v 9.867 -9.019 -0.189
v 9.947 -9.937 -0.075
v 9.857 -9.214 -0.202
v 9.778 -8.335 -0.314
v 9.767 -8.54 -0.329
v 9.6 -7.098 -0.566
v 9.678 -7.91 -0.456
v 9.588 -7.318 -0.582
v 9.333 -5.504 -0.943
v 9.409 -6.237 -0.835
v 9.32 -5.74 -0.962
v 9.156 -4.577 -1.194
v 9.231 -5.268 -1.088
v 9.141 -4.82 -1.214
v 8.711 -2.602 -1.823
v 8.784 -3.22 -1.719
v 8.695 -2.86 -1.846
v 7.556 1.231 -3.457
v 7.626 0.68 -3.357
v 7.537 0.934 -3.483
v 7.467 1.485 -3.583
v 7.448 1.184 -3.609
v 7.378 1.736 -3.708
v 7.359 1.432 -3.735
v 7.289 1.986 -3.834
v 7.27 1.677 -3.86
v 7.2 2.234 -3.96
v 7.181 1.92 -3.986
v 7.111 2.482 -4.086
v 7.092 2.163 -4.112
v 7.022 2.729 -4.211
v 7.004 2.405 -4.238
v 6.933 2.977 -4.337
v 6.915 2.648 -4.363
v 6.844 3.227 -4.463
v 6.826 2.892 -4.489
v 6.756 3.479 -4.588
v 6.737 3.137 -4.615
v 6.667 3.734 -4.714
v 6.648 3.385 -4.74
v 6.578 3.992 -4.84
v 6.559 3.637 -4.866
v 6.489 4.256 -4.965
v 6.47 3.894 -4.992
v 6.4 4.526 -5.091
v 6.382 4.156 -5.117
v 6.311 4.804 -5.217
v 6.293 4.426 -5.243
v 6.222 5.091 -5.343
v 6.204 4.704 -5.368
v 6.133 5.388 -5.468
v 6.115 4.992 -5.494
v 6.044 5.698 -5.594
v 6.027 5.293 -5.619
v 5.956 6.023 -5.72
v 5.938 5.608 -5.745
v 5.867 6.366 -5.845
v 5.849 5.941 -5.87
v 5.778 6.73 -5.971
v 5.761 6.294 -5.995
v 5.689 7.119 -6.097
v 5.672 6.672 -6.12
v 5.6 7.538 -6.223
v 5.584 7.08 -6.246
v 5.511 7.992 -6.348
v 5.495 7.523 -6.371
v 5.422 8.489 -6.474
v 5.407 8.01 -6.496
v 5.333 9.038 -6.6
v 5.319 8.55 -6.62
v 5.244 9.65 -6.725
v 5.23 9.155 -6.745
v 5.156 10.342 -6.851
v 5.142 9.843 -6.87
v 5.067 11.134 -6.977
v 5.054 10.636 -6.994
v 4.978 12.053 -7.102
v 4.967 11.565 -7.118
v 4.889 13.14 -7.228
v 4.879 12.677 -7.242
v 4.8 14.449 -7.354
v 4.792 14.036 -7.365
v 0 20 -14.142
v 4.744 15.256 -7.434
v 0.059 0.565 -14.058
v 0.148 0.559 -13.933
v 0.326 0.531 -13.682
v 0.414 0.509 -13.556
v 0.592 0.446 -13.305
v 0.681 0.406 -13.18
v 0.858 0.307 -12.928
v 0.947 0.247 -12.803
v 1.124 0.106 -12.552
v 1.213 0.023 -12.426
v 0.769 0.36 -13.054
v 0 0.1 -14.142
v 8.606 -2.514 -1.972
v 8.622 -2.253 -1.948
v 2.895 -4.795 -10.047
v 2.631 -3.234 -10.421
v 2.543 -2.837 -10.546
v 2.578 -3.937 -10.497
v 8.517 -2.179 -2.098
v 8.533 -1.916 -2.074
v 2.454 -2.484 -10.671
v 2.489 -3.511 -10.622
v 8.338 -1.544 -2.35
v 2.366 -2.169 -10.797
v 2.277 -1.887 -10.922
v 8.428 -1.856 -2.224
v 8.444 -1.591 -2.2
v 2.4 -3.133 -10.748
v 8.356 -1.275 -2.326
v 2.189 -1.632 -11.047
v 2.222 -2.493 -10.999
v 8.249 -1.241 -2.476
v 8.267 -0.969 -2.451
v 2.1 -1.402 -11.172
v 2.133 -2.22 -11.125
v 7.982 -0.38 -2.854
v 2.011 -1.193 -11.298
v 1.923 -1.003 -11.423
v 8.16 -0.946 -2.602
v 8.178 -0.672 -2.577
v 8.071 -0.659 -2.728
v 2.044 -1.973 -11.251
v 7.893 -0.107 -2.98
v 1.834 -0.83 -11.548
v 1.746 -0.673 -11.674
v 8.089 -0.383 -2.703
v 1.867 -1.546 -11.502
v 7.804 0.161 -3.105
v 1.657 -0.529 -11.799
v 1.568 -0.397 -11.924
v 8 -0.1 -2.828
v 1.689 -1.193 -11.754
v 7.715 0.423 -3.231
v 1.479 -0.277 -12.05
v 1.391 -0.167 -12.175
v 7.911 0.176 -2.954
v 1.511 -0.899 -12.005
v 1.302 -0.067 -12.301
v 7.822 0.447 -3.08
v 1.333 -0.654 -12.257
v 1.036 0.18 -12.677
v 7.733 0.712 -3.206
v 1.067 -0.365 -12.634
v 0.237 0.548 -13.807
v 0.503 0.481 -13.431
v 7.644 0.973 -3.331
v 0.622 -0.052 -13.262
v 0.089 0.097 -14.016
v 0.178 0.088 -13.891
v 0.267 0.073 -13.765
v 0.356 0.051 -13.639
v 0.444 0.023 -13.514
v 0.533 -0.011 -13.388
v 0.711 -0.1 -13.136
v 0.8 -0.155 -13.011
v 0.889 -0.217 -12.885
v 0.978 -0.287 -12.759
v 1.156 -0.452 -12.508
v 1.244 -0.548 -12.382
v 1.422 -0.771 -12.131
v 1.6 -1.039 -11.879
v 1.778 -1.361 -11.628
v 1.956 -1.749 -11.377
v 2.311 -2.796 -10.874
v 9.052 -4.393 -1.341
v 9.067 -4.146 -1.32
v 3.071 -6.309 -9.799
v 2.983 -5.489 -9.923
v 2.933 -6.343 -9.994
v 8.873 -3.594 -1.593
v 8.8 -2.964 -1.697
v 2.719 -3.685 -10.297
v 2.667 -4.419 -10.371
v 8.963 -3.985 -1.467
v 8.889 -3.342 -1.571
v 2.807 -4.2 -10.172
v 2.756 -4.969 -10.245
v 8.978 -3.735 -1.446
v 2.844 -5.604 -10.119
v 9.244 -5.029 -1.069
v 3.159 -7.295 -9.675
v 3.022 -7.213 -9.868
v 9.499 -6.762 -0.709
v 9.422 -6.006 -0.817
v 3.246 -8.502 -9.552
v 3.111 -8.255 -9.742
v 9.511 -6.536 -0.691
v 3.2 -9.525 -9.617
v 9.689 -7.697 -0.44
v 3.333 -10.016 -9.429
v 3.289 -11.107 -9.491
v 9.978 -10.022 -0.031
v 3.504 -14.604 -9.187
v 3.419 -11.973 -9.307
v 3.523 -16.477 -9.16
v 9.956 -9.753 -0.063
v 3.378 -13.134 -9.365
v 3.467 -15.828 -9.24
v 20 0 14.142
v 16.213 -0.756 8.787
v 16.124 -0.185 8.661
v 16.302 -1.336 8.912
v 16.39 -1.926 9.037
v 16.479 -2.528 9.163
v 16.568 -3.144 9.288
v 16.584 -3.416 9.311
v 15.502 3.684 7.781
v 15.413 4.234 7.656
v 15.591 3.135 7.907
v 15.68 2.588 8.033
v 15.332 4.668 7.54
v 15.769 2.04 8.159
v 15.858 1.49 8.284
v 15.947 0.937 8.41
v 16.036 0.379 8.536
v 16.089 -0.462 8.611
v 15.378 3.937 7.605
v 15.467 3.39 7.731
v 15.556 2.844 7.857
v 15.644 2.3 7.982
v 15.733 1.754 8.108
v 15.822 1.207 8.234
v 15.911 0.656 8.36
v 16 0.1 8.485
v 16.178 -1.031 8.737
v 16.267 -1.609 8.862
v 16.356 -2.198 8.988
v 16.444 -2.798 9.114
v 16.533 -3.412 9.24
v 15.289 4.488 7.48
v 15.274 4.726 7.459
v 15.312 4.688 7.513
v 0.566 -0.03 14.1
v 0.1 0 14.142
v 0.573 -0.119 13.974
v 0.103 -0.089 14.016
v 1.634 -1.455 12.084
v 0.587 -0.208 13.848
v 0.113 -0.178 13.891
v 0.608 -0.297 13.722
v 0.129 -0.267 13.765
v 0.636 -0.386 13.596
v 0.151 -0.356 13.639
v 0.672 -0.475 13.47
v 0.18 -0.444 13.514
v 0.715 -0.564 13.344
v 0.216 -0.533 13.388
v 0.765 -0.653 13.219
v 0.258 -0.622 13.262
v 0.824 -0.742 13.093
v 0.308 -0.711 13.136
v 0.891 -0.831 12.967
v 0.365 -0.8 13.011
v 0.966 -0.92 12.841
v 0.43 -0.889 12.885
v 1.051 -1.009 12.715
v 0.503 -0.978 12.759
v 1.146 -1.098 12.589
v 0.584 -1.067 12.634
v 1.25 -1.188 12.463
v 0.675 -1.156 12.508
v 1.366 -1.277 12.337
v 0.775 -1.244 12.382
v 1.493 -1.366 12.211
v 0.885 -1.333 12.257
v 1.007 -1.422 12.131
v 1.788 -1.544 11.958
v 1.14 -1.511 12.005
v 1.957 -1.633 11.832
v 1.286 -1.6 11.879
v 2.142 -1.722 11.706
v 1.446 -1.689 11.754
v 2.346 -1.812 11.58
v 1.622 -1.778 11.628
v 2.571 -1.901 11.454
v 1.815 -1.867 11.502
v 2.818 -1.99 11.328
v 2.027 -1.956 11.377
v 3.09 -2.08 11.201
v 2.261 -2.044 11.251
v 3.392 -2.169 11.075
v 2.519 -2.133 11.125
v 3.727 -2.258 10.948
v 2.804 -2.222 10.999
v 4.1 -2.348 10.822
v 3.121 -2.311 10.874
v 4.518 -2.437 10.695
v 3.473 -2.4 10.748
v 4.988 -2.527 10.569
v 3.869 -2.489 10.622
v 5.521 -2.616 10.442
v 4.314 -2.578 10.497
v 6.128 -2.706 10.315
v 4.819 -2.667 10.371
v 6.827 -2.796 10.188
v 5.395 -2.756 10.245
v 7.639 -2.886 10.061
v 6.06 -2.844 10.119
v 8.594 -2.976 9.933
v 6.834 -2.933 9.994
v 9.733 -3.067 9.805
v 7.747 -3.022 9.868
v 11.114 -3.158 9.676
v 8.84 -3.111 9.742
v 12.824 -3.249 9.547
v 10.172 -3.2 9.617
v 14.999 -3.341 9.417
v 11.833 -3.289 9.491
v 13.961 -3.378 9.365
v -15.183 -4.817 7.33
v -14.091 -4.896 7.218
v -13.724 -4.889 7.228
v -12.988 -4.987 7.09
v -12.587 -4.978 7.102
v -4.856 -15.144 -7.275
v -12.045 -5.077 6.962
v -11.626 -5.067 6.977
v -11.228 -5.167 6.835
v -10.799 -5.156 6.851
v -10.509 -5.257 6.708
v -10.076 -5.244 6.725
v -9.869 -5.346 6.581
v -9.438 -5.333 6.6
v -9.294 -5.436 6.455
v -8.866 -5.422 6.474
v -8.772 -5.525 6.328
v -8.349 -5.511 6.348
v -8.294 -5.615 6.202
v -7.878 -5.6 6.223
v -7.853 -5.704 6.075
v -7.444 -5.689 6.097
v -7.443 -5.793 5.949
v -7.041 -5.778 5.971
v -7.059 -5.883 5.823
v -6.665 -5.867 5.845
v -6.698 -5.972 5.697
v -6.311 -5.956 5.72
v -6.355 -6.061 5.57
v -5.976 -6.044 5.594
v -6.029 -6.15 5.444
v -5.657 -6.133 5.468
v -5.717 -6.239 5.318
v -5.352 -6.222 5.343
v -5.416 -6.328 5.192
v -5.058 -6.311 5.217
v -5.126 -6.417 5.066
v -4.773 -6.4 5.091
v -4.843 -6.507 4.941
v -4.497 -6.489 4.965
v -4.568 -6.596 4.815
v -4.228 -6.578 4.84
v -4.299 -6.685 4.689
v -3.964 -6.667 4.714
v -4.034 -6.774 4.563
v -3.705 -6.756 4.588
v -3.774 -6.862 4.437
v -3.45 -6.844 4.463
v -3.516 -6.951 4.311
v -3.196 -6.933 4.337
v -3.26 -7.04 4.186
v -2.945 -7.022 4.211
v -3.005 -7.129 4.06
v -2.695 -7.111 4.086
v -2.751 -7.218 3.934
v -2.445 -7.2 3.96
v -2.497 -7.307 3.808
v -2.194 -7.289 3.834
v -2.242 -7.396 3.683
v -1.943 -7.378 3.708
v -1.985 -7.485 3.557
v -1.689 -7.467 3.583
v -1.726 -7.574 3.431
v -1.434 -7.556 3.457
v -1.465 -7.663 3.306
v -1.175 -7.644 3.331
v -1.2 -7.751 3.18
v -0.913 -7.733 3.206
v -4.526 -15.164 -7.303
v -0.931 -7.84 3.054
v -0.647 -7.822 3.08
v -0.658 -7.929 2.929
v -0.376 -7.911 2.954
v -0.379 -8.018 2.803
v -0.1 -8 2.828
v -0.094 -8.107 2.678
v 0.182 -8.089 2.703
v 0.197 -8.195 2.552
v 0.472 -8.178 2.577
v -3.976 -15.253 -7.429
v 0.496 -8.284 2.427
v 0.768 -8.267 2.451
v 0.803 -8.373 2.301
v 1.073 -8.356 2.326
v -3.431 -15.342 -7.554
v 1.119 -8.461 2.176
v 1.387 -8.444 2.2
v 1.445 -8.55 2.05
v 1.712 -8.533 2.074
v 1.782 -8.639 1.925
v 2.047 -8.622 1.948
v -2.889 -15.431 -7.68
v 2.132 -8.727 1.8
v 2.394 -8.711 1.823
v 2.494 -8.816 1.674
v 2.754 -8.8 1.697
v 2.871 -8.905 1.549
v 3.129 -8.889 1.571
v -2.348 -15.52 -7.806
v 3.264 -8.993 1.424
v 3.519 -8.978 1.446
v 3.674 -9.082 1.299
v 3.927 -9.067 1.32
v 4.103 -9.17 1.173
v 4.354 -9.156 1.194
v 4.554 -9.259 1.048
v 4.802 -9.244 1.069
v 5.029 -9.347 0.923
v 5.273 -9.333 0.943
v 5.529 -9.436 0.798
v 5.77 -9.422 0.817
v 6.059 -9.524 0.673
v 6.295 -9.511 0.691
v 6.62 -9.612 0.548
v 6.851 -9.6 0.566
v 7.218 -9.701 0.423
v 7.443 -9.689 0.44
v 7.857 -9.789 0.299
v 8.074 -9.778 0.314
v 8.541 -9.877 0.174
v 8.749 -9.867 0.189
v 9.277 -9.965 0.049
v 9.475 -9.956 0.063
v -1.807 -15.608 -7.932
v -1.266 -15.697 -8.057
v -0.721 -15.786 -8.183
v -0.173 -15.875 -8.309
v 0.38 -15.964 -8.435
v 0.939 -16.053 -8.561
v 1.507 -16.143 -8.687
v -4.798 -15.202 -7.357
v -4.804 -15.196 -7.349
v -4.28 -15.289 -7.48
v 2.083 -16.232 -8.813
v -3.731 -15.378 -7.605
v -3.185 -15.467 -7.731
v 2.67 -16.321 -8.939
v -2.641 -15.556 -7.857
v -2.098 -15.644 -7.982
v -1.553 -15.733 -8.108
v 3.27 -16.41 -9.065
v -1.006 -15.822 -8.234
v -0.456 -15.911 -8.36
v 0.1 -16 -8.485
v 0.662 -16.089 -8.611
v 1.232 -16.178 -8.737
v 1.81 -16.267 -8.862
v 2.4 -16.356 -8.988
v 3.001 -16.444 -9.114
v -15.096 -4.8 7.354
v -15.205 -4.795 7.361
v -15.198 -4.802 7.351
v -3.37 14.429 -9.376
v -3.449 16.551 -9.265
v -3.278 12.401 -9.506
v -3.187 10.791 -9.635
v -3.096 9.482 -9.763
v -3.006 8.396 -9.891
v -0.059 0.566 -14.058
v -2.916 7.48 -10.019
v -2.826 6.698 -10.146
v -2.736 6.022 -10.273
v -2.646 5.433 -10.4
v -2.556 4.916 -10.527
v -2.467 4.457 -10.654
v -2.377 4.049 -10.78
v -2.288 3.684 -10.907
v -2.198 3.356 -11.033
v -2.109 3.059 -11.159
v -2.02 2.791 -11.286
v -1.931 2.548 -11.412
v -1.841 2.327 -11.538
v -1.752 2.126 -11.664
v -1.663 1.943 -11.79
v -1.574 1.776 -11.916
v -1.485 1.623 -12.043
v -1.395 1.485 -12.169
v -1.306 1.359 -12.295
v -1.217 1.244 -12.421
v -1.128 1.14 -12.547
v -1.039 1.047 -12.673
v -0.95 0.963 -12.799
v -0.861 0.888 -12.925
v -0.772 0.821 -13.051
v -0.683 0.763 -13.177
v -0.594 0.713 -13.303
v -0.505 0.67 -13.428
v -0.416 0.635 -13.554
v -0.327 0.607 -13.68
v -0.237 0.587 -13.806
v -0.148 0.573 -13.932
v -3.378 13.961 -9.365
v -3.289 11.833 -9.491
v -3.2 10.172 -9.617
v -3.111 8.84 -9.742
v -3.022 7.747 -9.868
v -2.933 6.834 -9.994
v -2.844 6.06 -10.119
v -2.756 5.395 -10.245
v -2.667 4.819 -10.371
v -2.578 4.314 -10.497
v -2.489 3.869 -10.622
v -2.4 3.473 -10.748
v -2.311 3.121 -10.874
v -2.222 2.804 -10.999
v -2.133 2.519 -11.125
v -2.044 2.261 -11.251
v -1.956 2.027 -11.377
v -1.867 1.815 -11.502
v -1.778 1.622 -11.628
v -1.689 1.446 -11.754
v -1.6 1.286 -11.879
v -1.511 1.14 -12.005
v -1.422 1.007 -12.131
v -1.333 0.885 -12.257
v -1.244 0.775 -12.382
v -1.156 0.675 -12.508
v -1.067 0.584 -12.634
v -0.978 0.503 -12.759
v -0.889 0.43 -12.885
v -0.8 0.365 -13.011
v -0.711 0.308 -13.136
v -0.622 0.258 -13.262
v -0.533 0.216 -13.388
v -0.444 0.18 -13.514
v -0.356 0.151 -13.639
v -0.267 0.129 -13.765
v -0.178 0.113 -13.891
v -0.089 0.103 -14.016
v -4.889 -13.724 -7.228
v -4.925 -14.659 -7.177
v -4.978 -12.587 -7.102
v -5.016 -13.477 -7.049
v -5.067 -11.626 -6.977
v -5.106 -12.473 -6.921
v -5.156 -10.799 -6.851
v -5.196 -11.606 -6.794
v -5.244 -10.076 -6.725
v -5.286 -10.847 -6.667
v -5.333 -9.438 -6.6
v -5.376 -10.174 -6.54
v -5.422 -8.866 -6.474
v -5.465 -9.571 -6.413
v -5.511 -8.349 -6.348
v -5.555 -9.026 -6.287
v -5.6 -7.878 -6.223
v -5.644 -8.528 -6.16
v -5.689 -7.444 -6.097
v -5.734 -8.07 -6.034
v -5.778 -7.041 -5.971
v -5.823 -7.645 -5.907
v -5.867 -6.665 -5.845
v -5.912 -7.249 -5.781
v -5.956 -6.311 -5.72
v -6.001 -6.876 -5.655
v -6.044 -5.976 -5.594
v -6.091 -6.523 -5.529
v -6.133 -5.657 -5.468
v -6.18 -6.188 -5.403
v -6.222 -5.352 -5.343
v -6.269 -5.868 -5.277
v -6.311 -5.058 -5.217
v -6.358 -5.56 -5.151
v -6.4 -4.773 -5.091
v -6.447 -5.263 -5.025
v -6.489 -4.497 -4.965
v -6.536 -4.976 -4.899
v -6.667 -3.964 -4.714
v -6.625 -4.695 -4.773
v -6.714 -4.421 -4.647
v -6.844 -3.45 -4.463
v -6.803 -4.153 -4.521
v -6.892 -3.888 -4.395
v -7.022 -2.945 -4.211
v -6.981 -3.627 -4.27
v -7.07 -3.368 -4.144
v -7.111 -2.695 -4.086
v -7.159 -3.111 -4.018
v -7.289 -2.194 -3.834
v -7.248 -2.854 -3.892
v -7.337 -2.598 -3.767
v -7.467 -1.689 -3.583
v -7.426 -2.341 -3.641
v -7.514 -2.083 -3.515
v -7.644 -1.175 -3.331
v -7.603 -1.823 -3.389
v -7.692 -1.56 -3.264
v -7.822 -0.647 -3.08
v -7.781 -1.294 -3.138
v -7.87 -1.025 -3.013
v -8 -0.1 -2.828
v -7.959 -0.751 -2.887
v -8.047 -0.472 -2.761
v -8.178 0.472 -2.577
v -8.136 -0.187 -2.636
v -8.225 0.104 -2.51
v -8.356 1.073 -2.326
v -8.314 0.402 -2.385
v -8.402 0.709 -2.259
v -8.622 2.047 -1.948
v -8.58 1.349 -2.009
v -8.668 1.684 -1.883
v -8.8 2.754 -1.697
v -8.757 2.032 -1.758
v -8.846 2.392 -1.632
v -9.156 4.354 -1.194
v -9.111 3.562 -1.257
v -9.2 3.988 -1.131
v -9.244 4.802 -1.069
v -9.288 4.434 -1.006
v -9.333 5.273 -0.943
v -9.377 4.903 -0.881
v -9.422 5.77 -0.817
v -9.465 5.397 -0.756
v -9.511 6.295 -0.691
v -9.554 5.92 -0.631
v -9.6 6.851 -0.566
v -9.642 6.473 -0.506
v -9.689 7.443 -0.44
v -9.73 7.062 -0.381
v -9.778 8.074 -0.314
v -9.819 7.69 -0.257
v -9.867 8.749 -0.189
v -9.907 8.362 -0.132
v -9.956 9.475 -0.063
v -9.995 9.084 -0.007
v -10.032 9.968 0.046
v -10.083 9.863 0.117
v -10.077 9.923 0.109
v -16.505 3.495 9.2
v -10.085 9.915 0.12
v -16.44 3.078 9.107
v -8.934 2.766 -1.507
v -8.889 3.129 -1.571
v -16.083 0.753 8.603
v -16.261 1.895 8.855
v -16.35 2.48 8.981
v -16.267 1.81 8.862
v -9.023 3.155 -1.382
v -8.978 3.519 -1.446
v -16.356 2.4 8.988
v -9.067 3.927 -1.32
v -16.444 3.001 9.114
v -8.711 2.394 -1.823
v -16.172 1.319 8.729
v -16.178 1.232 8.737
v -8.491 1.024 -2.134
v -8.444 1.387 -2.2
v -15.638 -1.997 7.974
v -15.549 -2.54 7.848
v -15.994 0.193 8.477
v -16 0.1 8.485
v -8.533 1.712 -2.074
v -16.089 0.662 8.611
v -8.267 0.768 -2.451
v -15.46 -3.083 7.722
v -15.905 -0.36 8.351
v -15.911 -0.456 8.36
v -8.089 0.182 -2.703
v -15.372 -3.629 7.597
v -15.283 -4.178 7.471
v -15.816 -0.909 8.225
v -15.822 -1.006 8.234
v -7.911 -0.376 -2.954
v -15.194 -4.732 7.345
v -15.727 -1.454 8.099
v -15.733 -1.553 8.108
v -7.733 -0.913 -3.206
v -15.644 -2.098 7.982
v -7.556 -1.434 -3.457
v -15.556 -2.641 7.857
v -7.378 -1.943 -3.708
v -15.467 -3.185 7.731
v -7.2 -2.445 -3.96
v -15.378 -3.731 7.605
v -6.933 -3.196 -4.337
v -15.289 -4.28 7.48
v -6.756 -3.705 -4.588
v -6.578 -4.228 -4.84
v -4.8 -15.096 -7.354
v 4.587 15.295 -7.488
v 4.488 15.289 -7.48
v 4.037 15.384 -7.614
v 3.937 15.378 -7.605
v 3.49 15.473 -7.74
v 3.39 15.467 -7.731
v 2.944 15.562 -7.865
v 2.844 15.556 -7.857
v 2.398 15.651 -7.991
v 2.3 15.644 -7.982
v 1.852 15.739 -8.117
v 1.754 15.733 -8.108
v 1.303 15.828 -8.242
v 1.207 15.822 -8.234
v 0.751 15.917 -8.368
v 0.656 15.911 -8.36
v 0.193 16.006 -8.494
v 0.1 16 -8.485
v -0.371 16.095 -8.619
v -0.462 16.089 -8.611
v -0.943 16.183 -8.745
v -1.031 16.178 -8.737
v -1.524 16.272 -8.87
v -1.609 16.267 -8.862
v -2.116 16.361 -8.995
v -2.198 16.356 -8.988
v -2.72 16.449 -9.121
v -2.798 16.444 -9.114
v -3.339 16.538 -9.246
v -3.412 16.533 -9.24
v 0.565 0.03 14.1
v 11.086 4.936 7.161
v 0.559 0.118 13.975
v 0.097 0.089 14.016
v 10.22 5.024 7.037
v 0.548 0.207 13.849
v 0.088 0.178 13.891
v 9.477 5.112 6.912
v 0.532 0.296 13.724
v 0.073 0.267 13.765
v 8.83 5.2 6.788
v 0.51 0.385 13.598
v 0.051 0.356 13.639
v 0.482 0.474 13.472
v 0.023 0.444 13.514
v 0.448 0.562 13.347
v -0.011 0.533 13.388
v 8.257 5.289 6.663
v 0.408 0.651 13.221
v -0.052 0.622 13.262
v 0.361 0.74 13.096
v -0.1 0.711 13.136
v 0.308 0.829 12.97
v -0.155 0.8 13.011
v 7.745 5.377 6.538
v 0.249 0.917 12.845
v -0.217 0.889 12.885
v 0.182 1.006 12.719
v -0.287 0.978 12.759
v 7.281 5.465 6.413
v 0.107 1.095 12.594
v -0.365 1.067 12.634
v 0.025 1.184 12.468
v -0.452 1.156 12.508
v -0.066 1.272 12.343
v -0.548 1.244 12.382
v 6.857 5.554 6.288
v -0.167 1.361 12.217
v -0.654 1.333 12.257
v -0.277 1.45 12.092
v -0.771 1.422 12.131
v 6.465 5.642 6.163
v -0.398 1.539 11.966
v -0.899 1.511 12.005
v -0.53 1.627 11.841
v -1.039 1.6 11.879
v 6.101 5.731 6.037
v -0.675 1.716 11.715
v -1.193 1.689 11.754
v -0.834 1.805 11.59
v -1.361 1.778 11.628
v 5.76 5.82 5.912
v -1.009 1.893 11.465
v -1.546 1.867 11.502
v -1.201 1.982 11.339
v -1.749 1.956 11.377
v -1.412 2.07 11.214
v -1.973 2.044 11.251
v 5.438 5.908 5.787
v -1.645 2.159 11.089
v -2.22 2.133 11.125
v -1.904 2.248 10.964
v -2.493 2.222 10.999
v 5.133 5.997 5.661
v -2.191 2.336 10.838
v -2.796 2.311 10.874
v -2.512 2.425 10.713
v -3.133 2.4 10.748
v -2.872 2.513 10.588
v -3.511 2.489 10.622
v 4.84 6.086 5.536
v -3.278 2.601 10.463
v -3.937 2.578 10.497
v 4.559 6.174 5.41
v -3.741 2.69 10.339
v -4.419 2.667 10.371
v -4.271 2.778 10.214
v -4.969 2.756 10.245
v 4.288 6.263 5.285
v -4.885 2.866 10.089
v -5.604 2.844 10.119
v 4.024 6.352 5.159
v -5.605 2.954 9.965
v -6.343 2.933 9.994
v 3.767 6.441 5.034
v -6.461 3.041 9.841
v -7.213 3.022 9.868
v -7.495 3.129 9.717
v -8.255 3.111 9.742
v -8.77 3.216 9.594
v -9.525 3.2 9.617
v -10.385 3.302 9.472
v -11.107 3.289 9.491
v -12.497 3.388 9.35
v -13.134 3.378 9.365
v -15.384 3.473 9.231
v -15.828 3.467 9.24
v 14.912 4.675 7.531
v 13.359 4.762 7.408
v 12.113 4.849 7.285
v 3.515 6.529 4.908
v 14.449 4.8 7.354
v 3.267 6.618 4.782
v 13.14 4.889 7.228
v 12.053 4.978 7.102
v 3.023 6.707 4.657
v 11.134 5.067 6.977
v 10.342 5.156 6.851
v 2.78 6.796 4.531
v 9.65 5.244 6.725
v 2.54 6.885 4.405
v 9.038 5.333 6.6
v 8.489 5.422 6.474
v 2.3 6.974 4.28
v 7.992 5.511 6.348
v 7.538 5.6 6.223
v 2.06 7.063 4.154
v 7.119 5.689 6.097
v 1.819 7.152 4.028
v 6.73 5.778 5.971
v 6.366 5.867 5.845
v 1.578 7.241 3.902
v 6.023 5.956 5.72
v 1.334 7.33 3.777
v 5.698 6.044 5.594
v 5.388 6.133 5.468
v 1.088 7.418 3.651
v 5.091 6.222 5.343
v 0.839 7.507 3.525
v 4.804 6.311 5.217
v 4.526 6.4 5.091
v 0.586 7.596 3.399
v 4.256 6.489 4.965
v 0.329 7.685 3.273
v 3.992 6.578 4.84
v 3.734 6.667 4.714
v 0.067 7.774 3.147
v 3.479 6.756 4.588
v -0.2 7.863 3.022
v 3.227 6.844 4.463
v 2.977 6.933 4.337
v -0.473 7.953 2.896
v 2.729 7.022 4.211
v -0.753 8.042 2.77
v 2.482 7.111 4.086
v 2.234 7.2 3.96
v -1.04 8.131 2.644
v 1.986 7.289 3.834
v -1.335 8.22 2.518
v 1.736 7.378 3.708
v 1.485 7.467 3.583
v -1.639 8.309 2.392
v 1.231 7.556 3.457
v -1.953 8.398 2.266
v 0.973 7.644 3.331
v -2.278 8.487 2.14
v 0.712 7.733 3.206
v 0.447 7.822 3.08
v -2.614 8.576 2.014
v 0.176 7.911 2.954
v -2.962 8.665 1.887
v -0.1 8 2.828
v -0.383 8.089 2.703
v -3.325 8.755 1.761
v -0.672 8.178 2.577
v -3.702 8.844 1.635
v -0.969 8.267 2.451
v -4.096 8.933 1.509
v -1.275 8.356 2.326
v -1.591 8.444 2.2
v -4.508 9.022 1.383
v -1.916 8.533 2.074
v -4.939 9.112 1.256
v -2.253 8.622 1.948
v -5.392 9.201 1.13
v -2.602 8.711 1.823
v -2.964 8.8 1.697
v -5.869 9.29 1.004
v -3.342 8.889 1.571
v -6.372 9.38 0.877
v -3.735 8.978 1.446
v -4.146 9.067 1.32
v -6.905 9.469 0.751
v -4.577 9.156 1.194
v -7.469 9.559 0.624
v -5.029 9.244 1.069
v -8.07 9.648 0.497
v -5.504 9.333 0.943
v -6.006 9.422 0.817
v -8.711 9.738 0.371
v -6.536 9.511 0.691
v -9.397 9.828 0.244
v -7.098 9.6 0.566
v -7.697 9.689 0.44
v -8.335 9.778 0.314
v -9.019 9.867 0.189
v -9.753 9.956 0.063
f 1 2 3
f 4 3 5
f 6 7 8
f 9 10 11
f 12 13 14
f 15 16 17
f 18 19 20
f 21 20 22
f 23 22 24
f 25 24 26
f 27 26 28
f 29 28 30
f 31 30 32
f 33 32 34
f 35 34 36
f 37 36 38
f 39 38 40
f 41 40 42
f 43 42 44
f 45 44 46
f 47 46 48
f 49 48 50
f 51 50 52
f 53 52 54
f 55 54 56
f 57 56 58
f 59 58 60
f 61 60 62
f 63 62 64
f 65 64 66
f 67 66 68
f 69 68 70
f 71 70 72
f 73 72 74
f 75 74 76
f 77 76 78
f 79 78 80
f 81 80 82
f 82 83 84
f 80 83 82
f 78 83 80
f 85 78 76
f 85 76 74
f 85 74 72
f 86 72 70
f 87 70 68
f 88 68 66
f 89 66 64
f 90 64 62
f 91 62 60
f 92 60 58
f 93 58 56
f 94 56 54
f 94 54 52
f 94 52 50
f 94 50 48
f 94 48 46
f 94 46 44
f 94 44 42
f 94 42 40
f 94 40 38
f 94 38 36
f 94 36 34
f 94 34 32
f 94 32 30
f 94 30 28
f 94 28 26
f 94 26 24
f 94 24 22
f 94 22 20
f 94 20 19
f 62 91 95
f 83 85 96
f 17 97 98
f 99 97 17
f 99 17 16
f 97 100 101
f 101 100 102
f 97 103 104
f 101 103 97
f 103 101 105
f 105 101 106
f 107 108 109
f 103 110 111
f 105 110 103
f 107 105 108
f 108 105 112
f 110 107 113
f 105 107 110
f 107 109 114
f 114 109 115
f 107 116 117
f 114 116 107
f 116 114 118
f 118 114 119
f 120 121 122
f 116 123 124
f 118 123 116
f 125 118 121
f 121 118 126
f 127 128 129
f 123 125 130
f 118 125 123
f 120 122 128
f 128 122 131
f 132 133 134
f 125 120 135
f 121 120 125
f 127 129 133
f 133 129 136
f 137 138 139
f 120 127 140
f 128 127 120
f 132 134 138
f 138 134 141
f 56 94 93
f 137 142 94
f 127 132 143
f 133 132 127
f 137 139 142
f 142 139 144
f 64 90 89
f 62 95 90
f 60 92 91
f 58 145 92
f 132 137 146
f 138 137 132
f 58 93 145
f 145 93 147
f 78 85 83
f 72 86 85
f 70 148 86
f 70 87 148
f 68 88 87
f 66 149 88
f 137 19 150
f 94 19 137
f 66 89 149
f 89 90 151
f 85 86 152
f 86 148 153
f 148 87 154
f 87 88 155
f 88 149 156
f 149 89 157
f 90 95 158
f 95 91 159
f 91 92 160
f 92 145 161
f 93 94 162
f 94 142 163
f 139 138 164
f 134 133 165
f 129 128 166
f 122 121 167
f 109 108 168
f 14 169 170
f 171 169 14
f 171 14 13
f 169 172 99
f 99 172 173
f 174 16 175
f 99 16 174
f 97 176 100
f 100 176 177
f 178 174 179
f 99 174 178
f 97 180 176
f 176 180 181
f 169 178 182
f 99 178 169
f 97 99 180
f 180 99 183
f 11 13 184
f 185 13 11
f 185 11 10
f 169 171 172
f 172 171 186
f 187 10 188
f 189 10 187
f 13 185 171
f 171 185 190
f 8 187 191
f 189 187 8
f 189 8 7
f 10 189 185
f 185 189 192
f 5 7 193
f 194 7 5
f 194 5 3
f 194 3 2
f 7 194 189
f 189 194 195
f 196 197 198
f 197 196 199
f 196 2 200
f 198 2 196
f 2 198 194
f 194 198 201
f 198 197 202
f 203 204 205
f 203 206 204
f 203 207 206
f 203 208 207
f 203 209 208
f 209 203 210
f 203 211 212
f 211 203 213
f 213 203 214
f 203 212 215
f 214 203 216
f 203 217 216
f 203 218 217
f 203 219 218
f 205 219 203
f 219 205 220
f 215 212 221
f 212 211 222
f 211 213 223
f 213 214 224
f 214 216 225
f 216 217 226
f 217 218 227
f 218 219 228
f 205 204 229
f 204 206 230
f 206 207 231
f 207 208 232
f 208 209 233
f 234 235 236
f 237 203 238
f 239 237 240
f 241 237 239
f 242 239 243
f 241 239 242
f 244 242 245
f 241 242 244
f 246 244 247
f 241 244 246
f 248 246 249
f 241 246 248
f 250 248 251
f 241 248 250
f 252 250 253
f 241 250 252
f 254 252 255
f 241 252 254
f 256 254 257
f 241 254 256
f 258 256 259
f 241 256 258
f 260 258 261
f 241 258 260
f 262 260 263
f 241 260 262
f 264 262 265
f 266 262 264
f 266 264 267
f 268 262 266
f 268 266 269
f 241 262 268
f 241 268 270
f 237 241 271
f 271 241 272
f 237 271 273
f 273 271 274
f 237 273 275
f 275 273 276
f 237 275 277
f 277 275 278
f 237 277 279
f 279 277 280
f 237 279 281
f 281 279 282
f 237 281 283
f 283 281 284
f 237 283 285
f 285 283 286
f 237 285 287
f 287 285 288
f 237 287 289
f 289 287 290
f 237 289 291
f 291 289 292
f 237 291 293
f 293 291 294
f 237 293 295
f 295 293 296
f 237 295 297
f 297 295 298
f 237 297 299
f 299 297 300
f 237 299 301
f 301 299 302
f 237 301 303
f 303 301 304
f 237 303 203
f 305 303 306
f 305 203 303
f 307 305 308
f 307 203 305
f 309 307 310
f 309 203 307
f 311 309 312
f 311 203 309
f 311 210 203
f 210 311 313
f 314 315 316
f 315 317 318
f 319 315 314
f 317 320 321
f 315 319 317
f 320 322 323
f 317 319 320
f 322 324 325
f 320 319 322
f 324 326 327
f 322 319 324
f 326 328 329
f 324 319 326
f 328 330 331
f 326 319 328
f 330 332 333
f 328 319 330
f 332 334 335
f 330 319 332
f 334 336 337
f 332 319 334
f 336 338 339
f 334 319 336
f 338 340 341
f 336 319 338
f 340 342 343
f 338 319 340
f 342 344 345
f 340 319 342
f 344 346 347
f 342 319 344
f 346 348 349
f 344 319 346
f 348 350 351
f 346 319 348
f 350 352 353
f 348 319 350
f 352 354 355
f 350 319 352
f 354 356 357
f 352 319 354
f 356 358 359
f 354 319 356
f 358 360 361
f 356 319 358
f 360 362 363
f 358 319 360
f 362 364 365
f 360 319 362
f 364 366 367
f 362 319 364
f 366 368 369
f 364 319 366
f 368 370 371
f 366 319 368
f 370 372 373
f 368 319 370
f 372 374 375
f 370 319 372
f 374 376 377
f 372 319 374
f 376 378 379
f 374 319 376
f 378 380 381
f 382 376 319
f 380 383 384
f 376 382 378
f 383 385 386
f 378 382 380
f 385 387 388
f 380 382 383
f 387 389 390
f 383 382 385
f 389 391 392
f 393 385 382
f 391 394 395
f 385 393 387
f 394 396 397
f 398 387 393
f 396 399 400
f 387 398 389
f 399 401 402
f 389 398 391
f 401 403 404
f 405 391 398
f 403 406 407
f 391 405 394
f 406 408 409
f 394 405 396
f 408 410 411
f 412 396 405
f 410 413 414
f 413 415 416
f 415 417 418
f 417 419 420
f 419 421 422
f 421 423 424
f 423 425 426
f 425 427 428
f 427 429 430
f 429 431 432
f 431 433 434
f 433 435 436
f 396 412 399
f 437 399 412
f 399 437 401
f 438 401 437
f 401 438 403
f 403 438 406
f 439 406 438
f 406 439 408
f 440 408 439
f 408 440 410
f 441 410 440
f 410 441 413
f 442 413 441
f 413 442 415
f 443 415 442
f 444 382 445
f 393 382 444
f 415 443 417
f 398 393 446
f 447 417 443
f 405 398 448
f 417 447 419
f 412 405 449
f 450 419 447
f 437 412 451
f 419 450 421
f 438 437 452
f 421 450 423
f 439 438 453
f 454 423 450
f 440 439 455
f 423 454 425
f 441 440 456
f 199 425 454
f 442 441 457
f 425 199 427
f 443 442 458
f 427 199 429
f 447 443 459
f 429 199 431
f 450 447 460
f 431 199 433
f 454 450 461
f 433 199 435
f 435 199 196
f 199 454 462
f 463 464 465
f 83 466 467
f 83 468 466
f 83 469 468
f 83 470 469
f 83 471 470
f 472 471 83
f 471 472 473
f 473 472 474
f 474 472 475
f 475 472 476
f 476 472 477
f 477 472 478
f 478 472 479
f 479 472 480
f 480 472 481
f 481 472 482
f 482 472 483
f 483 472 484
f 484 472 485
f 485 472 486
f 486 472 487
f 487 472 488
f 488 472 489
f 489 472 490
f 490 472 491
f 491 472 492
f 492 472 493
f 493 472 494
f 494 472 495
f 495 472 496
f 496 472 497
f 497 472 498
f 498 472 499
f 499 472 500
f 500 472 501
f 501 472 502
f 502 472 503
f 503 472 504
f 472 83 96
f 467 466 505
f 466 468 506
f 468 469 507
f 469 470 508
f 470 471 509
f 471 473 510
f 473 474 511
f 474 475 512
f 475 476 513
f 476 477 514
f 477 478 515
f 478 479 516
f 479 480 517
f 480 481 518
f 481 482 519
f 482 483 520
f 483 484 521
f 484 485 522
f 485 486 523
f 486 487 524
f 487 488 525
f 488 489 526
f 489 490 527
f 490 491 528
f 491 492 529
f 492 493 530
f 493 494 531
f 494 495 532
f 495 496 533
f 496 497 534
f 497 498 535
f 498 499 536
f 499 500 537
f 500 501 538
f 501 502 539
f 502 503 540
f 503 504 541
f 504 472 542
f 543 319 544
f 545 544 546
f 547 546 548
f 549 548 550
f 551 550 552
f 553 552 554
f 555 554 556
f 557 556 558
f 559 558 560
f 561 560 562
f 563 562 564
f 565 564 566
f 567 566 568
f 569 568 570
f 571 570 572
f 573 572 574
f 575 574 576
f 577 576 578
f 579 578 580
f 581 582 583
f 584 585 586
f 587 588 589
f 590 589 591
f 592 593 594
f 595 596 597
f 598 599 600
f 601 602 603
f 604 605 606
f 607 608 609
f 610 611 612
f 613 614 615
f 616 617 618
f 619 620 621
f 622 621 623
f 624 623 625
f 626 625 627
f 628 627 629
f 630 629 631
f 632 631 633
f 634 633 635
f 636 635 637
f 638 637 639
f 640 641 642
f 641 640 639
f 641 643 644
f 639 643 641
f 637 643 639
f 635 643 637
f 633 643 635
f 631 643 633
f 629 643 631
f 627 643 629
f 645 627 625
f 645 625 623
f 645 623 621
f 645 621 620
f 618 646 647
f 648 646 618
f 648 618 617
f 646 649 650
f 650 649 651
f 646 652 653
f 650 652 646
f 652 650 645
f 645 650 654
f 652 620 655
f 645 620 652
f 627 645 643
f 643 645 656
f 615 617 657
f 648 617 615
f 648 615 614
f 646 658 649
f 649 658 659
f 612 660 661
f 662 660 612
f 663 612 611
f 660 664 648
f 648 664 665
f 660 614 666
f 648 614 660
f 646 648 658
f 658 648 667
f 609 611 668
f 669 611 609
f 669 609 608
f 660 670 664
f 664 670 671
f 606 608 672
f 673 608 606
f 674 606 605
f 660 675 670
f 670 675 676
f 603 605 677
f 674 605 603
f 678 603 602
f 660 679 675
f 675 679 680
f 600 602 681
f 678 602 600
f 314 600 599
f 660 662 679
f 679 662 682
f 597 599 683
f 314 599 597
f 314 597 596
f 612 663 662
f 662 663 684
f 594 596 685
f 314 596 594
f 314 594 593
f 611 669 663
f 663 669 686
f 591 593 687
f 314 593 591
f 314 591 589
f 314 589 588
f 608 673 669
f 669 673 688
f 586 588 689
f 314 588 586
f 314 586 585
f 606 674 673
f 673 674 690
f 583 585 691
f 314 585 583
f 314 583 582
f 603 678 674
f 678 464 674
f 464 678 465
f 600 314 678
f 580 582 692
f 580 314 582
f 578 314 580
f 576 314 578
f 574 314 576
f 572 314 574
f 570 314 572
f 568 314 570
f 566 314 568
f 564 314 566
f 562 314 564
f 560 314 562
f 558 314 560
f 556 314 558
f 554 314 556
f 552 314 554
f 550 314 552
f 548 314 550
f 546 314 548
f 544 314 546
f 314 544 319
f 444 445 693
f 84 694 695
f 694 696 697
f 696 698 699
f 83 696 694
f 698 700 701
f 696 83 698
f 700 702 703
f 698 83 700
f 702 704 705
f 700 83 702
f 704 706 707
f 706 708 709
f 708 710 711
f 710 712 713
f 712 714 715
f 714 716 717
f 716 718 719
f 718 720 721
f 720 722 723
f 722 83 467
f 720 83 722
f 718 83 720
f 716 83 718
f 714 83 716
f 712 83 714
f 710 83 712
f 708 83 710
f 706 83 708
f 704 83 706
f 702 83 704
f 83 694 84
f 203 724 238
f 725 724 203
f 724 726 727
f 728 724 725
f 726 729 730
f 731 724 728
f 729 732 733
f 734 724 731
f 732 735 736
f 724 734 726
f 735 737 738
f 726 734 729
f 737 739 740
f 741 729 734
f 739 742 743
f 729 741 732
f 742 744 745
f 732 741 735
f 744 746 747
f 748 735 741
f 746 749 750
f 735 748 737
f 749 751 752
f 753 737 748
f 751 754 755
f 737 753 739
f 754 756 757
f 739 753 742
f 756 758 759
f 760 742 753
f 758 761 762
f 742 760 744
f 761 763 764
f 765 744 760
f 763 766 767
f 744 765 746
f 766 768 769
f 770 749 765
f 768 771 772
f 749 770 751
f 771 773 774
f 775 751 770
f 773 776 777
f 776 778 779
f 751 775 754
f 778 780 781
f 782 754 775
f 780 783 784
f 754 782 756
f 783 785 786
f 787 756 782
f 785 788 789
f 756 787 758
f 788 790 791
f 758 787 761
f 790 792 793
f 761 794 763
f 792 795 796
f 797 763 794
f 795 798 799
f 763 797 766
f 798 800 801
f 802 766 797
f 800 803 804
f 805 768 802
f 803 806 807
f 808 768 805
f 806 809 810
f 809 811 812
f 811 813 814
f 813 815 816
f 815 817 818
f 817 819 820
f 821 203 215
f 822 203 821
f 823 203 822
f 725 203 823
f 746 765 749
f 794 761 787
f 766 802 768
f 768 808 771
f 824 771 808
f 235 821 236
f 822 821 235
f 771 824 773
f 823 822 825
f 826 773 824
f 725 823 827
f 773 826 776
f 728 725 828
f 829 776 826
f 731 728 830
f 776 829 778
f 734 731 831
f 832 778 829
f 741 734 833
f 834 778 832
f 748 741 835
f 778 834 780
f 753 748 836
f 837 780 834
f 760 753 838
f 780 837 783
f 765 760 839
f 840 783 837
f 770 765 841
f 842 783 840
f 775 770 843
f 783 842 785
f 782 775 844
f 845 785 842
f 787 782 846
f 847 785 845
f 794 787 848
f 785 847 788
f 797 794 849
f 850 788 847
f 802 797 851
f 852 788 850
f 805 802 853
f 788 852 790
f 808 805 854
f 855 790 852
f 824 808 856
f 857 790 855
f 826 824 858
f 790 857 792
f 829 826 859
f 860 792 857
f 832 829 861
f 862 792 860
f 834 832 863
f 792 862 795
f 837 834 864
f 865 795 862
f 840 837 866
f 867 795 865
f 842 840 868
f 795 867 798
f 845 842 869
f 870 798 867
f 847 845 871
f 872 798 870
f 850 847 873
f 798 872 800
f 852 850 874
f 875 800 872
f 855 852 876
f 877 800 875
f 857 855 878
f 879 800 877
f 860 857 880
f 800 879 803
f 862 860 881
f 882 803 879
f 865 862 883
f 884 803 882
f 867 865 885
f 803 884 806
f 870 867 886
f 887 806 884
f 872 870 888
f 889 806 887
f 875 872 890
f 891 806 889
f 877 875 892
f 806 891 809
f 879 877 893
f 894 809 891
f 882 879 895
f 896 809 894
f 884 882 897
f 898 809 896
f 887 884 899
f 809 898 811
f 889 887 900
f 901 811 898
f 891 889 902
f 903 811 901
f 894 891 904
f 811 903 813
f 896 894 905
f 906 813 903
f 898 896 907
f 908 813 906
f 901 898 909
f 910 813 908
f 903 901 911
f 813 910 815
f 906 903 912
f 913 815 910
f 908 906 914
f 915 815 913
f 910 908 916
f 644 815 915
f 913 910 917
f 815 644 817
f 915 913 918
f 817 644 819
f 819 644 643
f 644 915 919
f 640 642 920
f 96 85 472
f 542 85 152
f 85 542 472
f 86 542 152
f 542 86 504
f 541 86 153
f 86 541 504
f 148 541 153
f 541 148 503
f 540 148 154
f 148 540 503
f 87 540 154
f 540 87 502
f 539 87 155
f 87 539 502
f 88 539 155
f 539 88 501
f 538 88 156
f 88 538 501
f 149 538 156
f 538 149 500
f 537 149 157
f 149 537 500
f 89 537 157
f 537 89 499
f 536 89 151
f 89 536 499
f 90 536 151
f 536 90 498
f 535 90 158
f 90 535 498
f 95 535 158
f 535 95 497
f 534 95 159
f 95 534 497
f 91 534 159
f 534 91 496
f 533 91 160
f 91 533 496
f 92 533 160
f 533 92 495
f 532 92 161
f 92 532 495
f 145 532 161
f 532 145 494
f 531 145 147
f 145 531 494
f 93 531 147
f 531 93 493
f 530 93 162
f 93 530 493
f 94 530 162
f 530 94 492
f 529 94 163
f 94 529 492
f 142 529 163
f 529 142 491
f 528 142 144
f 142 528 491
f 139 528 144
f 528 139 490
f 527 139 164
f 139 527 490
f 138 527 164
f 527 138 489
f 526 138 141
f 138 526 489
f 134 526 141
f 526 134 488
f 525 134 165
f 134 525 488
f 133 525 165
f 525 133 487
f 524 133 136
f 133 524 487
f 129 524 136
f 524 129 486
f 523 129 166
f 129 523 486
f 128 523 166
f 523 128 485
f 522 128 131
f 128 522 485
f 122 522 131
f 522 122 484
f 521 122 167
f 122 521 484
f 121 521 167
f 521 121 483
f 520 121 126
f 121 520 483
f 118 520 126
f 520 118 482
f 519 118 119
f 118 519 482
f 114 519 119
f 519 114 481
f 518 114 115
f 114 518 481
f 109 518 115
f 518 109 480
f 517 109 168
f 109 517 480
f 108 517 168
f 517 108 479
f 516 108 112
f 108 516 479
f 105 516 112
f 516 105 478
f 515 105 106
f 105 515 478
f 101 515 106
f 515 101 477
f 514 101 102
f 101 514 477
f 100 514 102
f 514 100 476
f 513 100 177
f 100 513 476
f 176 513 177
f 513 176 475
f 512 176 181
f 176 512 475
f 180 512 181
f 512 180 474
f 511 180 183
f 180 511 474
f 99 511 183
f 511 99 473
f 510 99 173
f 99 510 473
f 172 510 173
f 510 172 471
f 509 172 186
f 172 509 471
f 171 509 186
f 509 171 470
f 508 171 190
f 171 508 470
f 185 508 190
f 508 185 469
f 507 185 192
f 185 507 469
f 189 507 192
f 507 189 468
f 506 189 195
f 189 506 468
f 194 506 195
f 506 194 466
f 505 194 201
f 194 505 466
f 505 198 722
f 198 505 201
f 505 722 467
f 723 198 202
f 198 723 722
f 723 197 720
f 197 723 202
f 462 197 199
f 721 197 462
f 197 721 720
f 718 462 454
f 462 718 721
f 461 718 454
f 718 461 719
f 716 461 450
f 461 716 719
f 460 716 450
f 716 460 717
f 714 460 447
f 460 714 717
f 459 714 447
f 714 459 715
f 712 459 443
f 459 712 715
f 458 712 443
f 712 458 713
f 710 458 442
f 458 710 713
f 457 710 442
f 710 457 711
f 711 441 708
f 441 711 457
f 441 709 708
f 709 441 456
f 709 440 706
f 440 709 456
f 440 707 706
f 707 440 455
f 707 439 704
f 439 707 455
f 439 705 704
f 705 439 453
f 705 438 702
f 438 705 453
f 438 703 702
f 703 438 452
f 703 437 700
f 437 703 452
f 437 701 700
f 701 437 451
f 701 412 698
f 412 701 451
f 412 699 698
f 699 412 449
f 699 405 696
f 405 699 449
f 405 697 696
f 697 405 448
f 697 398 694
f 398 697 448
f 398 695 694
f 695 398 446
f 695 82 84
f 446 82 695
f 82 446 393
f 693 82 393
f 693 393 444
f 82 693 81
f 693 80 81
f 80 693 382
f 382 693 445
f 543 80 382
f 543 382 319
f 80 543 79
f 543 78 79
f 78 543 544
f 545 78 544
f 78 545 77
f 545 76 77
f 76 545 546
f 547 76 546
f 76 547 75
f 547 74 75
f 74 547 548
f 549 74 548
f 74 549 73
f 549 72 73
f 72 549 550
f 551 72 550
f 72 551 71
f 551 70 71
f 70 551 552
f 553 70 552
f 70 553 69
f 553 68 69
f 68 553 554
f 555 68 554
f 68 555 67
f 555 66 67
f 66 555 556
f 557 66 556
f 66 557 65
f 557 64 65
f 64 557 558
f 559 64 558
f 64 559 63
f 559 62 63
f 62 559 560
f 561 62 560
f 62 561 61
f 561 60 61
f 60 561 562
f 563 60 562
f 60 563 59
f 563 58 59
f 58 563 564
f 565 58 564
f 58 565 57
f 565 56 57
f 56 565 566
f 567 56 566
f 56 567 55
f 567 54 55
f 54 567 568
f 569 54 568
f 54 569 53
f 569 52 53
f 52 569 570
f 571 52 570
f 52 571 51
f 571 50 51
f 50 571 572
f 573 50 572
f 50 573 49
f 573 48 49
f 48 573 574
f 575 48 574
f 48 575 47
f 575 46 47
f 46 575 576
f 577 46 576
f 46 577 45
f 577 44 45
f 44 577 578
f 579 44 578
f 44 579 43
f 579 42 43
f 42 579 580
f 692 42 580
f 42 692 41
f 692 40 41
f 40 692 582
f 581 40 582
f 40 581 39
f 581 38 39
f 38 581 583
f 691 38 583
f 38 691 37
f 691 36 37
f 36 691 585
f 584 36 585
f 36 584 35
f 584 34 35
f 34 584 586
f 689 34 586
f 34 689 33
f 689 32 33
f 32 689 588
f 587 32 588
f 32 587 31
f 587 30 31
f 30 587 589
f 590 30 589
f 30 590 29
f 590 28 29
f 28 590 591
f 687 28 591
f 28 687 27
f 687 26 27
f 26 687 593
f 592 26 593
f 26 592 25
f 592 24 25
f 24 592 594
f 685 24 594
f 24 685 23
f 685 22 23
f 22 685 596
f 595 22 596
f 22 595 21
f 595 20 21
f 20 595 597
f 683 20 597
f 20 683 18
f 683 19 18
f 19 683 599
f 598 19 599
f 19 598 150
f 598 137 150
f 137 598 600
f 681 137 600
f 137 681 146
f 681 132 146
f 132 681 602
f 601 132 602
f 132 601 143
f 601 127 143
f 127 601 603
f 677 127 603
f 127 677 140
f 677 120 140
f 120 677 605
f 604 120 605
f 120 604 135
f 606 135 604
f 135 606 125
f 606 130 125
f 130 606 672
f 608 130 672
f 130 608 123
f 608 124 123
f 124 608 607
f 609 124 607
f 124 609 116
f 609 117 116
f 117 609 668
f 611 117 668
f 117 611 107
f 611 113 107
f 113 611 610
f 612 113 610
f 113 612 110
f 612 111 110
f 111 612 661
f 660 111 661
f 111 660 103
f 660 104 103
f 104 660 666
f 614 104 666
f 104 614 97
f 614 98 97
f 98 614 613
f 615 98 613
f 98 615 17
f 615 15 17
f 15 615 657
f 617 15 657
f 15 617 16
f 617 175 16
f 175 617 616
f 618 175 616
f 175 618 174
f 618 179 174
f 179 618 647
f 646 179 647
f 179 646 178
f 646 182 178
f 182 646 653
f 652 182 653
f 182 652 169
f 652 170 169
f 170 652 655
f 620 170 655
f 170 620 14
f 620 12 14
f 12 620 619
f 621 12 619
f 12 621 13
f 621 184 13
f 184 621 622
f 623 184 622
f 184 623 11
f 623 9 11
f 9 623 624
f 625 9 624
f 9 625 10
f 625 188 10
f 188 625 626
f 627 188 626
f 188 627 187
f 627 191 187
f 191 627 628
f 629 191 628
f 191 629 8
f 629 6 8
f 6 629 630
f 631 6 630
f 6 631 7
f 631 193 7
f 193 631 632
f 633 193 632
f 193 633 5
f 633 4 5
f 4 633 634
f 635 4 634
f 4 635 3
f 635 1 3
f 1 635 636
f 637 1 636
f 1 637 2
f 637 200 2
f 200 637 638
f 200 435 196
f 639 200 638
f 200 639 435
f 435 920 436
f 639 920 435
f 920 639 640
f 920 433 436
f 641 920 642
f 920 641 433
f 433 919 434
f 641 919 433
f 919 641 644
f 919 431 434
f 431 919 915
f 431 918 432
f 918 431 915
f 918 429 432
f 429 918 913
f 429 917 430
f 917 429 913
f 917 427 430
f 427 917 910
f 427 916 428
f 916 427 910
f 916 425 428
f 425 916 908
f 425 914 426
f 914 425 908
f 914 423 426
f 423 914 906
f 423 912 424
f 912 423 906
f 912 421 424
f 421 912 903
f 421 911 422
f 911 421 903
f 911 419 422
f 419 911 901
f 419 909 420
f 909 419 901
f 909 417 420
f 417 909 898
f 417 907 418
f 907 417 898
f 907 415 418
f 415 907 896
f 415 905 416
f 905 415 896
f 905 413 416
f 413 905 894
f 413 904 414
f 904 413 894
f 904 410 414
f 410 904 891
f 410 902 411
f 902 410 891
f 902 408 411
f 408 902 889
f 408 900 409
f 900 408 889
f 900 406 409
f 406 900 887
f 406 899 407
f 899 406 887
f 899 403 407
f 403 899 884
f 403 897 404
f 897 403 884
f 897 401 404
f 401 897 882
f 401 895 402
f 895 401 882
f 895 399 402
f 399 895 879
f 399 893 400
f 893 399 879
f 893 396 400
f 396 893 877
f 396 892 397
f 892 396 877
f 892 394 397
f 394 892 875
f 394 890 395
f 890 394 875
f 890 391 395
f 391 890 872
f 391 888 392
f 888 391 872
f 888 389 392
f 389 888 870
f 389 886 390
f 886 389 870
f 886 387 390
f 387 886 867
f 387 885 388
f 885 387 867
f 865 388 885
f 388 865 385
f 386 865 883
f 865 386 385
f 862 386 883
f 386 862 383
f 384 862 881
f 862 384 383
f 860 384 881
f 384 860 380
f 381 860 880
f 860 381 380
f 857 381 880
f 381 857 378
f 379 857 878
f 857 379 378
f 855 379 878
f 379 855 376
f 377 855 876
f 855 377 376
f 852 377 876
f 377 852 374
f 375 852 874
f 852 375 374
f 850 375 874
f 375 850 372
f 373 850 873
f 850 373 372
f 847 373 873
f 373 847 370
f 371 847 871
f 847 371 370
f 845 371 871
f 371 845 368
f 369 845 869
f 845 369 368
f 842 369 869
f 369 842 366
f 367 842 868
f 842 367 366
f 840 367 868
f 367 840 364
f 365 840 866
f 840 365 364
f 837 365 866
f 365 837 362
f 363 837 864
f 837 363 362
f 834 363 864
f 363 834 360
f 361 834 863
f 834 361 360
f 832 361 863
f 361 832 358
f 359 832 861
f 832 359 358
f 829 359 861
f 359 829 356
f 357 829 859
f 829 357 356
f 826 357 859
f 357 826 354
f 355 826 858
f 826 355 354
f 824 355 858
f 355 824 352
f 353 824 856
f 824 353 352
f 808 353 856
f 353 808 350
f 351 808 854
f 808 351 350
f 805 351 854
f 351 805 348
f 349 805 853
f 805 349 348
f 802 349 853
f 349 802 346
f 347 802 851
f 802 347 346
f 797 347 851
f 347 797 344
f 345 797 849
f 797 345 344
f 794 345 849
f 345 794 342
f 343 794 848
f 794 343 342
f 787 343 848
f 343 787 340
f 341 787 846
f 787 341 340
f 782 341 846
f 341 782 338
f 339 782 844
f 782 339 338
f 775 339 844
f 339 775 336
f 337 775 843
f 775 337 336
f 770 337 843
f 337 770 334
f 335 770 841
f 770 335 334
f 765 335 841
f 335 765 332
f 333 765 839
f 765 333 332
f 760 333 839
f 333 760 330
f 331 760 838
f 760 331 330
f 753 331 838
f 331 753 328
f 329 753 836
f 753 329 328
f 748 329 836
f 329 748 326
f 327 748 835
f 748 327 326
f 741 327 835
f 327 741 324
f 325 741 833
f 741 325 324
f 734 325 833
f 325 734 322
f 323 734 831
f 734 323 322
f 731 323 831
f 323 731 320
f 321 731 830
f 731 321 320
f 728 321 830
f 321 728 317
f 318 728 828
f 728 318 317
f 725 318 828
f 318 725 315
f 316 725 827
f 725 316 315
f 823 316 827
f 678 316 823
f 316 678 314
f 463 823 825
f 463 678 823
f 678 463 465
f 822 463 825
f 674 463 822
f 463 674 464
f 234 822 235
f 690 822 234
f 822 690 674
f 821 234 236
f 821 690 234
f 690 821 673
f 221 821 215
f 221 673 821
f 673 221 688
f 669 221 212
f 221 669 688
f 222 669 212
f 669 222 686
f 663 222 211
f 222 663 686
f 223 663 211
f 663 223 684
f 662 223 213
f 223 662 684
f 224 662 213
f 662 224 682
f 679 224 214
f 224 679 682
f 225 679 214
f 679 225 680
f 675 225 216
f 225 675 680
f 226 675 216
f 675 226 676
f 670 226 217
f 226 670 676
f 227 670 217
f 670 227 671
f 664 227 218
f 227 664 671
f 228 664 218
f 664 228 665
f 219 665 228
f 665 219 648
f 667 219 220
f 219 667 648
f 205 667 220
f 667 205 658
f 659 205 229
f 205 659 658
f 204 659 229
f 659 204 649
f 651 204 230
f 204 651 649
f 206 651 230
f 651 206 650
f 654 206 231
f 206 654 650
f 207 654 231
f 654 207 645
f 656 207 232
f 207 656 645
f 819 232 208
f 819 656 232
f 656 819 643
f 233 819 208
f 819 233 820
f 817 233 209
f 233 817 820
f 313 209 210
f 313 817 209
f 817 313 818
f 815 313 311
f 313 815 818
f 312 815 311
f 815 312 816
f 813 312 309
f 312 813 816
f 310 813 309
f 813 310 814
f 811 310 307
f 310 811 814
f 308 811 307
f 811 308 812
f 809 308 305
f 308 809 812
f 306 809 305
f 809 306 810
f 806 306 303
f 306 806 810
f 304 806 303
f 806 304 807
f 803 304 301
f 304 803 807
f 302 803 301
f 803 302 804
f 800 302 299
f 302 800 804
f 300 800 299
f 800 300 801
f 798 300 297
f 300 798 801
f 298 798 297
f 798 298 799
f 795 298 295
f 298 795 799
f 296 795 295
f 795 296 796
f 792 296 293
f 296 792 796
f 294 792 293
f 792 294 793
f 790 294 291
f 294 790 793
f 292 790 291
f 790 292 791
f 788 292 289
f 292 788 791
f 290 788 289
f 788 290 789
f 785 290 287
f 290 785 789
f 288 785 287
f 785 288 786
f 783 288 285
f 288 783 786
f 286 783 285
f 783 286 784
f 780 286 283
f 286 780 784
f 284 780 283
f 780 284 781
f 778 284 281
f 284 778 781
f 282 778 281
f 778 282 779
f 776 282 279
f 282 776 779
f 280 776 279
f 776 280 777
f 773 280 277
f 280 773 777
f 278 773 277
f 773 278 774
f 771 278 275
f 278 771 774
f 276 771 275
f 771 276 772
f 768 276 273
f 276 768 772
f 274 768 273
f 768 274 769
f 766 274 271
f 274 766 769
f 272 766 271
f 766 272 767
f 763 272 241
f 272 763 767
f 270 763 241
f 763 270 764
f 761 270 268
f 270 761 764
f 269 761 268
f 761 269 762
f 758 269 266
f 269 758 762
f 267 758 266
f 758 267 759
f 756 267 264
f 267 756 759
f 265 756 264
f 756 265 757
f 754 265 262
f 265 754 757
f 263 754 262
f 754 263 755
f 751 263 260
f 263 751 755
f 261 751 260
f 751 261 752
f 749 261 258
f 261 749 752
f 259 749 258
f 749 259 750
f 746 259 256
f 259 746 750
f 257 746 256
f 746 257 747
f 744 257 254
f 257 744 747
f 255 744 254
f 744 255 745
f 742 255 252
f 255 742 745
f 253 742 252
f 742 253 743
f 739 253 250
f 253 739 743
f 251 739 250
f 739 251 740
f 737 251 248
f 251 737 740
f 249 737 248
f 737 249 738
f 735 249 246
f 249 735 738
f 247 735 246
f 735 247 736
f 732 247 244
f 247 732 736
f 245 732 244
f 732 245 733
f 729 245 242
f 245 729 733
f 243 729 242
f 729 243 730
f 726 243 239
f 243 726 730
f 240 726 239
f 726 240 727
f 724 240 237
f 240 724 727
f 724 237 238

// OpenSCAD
step=2;

intersection()
{
  polyhedron ( points = [[0, 20, -20*sqrt(2)/2],
			 [0, -20,-20*sqrt(2)/2],
			 [20, 0,  20*sqrt(2)/2],
			 [-20, 0, 20*sqrt(2)/2],
			 ],
		 faces = [[0,1,2],
			  [0,3,1],
			  [0,2,3],
			  [1,3,2]]
             );
  translate([0, 0, -20*sqrt(2)/2]){
    linear_extrude(height=20*sqrt(2), twist=360+90, slices=(360+90)/step) {
      union ()
      {
        translate([-20,0.1,0]){
	  square([60,20]);
	}
      }
    }
  }
}
